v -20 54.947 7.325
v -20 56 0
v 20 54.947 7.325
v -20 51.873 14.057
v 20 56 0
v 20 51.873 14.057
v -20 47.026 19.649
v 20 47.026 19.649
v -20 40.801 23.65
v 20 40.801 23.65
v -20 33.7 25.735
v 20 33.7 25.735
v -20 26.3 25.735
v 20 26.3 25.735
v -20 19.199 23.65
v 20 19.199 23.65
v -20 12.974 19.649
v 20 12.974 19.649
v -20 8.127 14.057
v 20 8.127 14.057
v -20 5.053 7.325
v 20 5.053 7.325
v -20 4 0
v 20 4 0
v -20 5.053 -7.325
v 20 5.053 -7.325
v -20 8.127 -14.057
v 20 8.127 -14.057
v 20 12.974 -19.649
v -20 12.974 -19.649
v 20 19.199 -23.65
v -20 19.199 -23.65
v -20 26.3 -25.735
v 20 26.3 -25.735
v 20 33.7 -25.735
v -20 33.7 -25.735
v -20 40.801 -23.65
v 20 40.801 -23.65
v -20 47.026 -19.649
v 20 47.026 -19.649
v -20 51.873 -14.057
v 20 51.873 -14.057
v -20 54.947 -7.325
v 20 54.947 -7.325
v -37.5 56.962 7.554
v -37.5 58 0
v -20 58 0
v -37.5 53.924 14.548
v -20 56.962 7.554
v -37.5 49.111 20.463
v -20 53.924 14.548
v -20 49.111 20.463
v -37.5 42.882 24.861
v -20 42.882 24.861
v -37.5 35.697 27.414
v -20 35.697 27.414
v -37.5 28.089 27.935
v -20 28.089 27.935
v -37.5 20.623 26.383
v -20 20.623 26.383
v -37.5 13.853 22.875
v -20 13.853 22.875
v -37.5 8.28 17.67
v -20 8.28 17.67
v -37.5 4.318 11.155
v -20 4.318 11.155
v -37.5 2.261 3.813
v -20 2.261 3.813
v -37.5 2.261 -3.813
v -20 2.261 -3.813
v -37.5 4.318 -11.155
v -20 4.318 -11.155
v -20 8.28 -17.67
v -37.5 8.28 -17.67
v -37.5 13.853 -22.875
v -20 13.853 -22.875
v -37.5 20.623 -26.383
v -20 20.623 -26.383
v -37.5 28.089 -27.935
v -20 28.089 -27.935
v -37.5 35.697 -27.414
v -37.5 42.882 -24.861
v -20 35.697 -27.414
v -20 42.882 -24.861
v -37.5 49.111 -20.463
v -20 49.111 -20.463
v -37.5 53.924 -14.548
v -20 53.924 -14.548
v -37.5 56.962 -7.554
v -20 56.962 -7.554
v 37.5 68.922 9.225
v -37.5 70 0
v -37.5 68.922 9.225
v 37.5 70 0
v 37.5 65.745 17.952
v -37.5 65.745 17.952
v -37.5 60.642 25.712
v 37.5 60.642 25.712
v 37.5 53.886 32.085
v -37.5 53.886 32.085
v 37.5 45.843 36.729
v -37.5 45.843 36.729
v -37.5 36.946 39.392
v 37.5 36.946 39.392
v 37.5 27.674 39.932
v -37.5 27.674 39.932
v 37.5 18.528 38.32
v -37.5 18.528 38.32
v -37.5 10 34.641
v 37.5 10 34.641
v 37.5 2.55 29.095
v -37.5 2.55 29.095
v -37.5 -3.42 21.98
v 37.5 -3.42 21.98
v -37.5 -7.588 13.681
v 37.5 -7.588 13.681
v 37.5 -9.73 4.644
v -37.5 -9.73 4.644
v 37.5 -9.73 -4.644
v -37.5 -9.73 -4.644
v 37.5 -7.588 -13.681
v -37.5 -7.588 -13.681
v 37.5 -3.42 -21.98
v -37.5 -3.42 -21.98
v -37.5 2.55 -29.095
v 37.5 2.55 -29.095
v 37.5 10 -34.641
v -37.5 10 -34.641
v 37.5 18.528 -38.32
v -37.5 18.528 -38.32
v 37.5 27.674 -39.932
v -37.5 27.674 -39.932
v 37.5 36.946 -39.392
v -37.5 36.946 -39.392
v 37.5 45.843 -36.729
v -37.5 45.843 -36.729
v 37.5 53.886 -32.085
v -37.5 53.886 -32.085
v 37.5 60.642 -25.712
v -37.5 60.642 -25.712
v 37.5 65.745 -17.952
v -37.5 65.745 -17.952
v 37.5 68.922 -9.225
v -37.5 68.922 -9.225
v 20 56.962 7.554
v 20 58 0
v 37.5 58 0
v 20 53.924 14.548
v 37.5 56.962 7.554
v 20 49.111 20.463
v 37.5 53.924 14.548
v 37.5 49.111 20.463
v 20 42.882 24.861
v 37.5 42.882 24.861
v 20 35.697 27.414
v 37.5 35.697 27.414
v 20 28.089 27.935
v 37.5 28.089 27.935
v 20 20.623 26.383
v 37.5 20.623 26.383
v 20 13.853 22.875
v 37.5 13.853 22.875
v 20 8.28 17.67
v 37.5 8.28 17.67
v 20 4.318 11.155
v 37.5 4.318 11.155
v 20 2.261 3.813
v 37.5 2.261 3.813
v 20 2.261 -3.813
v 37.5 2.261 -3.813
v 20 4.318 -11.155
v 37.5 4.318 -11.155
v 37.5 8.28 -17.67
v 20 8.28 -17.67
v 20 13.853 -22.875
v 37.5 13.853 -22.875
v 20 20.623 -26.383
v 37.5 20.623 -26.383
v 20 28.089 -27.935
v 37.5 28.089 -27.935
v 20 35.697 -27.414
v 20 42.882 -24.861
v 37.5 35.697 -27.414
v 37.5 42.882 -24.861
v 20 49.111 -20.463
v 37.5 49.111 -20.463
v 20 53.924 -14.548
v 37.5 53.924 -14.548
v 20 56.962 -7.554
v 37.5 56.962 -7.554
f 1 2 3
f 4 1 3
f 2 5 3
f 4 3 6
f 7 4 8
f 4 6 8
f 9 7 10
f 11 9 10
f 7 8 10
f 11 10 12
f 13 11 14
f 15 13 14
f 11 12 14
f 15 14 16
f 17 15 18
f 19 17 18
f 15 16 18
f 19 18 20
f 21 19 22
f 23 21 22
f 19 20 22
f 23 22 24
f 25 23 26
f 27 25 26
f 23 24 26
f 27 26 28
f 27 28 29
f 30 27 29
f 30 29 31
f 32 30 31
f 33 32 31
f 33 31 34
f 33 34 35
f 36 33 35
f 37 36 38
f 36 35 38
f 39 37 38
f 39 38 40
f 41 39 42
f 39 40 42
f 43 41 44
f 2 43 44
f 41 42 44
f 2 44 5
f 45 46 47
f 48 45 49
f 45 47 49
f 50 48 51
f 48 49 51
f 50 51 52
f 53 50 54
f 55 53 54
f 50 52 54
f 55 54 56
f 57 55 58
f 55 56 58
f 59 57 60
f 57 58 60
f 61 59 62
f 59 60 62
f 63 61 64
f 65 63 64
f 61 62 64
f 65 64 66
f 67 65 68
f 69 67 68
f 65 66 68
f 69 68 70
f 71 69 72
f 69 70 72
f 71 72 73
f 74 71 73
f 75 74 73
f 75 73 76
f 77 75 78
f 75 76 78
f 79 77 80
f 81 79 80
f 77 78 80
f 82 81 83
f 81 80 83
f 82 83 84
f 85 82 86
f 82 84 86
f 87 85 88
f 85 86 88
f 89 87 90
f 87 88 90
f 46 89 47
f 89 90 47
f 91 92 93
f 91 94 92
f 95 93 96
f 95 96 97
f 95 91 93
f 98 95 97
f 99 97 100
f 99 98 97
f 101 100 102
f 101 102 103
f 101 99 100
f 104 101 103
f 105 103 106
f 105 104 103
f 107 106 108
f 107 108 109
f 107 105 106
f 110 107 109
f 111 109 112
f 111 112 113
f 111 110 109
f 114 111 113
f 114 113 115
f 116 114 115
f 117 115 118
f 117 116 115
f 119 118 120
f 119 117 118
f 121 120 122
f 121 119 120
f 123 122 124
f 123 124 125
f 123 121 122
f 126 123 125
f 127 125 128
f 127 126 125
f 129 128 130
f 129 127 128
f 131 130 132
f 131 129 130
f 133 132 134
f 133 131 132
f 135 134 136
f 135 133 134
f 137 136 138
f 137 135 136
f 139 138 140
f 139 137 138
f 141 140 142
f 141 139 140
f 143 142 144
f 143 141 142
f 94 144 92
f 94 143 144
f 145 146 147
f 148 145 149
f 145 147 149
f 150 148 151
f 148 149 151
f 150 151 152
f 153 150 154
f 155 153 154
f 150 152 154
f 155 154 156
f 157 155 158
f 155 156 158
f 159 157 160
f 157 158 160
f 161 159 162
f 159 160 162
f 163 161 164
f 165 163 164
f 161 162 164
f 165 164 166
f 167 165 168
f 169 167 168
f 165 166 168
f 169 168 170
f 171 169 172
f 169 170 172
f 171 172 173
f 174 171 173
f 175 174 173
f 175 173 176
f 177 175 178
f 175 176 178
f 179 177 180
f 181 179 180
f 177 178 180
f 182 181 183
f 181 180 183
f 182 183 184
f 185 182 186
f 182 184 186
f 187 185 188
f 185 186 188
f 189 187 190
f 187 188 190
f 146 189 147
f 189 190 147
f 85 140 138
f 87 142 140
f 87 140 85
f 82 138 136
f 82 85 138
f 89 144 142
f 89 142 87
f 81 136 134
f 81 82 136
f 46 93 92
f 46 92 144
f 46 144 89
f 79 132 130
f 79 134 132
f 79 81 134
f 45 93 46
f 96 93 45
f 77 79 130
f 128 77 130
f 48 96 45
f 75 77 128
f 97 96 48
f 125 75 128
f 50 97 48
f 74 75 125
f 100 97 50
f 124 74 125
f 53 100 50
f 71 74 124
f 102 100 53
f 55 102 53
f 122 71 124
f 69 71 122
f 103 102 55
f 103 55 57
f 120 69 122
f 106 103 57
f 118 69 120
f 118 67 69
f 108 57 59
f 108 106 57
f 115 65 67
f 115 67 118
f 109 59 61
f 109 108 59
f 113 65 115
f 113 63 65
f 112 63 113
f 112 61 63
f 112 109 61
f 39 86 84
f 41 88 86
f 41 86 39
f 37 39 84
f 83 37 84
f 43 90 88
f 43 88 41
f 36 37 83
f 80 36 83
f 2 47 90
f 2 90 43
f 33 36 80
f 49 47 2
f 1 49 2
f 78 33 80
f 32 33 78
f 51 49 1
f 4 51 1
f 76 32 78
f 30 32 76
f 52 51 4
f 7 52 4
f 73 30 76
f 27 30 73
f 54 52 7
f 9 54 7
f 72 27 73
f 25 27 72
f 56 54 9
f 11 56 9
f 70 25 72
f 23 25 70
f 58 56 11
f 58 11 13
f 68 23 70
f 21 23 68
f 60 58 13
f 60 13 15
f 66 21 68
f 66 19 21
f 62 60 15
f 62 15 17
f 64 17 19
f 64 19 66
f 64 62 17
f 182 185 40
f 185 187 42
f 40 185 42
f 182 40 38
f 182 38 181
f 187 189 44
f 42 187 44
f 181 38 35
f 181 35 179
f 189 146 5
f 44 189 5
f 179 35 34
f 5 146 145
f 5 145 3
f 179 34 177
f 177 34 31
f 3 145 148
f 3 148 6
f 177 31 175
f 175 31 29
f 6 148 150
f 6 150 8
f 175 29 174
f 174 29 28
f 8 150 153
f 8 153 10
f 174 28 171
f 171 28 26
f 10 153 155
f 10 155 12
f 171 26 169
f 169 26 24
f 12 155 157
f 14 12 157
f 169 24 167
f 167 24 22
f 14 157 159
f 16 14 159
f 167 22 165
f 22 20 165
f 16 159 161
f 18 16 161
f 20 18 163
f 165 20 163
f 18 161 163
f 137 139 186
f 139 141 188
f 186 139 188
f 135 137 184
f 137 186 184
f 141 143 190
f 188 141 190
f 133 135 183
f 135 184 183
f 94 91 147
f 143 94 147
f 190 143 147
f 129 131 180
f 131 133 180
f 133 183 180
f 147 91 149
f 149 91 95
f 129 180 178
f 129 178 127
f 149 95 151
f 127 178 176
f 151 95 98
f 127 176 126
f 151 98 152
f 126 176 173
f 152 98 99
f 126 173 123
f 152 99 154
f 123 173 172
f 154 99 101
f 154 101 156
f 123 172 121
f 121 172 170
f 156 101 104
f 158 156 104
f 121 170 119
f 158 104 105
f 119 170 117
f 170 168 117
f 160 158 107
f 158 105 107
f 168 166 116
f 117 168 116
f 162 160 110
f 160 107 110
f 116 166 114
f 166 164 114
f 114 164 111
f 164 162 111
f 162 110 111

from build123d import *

# Parameters (mm, degrees)
SKETCH1_W   = 75
SKETCH1_H   = 12
SKETCH1_W_2 = 40
SKETCH1_H_2 = 2


with BuildPart() as part:
    # Sketch1 → Revolve1 (revolve)
    with BuildSketch(Plane.XY):
        with Locations((0, 64)):
            Rectangle(SKETCH1_W, SKETCH1_H)
        with Locations((0, 57)):
            Rectangle(SKETCH1_W_2, SKETCH1_H_2)
    revolve(axis=Axis((-1000, 30, 0), (1, 0, 0)))


solid = part.part
